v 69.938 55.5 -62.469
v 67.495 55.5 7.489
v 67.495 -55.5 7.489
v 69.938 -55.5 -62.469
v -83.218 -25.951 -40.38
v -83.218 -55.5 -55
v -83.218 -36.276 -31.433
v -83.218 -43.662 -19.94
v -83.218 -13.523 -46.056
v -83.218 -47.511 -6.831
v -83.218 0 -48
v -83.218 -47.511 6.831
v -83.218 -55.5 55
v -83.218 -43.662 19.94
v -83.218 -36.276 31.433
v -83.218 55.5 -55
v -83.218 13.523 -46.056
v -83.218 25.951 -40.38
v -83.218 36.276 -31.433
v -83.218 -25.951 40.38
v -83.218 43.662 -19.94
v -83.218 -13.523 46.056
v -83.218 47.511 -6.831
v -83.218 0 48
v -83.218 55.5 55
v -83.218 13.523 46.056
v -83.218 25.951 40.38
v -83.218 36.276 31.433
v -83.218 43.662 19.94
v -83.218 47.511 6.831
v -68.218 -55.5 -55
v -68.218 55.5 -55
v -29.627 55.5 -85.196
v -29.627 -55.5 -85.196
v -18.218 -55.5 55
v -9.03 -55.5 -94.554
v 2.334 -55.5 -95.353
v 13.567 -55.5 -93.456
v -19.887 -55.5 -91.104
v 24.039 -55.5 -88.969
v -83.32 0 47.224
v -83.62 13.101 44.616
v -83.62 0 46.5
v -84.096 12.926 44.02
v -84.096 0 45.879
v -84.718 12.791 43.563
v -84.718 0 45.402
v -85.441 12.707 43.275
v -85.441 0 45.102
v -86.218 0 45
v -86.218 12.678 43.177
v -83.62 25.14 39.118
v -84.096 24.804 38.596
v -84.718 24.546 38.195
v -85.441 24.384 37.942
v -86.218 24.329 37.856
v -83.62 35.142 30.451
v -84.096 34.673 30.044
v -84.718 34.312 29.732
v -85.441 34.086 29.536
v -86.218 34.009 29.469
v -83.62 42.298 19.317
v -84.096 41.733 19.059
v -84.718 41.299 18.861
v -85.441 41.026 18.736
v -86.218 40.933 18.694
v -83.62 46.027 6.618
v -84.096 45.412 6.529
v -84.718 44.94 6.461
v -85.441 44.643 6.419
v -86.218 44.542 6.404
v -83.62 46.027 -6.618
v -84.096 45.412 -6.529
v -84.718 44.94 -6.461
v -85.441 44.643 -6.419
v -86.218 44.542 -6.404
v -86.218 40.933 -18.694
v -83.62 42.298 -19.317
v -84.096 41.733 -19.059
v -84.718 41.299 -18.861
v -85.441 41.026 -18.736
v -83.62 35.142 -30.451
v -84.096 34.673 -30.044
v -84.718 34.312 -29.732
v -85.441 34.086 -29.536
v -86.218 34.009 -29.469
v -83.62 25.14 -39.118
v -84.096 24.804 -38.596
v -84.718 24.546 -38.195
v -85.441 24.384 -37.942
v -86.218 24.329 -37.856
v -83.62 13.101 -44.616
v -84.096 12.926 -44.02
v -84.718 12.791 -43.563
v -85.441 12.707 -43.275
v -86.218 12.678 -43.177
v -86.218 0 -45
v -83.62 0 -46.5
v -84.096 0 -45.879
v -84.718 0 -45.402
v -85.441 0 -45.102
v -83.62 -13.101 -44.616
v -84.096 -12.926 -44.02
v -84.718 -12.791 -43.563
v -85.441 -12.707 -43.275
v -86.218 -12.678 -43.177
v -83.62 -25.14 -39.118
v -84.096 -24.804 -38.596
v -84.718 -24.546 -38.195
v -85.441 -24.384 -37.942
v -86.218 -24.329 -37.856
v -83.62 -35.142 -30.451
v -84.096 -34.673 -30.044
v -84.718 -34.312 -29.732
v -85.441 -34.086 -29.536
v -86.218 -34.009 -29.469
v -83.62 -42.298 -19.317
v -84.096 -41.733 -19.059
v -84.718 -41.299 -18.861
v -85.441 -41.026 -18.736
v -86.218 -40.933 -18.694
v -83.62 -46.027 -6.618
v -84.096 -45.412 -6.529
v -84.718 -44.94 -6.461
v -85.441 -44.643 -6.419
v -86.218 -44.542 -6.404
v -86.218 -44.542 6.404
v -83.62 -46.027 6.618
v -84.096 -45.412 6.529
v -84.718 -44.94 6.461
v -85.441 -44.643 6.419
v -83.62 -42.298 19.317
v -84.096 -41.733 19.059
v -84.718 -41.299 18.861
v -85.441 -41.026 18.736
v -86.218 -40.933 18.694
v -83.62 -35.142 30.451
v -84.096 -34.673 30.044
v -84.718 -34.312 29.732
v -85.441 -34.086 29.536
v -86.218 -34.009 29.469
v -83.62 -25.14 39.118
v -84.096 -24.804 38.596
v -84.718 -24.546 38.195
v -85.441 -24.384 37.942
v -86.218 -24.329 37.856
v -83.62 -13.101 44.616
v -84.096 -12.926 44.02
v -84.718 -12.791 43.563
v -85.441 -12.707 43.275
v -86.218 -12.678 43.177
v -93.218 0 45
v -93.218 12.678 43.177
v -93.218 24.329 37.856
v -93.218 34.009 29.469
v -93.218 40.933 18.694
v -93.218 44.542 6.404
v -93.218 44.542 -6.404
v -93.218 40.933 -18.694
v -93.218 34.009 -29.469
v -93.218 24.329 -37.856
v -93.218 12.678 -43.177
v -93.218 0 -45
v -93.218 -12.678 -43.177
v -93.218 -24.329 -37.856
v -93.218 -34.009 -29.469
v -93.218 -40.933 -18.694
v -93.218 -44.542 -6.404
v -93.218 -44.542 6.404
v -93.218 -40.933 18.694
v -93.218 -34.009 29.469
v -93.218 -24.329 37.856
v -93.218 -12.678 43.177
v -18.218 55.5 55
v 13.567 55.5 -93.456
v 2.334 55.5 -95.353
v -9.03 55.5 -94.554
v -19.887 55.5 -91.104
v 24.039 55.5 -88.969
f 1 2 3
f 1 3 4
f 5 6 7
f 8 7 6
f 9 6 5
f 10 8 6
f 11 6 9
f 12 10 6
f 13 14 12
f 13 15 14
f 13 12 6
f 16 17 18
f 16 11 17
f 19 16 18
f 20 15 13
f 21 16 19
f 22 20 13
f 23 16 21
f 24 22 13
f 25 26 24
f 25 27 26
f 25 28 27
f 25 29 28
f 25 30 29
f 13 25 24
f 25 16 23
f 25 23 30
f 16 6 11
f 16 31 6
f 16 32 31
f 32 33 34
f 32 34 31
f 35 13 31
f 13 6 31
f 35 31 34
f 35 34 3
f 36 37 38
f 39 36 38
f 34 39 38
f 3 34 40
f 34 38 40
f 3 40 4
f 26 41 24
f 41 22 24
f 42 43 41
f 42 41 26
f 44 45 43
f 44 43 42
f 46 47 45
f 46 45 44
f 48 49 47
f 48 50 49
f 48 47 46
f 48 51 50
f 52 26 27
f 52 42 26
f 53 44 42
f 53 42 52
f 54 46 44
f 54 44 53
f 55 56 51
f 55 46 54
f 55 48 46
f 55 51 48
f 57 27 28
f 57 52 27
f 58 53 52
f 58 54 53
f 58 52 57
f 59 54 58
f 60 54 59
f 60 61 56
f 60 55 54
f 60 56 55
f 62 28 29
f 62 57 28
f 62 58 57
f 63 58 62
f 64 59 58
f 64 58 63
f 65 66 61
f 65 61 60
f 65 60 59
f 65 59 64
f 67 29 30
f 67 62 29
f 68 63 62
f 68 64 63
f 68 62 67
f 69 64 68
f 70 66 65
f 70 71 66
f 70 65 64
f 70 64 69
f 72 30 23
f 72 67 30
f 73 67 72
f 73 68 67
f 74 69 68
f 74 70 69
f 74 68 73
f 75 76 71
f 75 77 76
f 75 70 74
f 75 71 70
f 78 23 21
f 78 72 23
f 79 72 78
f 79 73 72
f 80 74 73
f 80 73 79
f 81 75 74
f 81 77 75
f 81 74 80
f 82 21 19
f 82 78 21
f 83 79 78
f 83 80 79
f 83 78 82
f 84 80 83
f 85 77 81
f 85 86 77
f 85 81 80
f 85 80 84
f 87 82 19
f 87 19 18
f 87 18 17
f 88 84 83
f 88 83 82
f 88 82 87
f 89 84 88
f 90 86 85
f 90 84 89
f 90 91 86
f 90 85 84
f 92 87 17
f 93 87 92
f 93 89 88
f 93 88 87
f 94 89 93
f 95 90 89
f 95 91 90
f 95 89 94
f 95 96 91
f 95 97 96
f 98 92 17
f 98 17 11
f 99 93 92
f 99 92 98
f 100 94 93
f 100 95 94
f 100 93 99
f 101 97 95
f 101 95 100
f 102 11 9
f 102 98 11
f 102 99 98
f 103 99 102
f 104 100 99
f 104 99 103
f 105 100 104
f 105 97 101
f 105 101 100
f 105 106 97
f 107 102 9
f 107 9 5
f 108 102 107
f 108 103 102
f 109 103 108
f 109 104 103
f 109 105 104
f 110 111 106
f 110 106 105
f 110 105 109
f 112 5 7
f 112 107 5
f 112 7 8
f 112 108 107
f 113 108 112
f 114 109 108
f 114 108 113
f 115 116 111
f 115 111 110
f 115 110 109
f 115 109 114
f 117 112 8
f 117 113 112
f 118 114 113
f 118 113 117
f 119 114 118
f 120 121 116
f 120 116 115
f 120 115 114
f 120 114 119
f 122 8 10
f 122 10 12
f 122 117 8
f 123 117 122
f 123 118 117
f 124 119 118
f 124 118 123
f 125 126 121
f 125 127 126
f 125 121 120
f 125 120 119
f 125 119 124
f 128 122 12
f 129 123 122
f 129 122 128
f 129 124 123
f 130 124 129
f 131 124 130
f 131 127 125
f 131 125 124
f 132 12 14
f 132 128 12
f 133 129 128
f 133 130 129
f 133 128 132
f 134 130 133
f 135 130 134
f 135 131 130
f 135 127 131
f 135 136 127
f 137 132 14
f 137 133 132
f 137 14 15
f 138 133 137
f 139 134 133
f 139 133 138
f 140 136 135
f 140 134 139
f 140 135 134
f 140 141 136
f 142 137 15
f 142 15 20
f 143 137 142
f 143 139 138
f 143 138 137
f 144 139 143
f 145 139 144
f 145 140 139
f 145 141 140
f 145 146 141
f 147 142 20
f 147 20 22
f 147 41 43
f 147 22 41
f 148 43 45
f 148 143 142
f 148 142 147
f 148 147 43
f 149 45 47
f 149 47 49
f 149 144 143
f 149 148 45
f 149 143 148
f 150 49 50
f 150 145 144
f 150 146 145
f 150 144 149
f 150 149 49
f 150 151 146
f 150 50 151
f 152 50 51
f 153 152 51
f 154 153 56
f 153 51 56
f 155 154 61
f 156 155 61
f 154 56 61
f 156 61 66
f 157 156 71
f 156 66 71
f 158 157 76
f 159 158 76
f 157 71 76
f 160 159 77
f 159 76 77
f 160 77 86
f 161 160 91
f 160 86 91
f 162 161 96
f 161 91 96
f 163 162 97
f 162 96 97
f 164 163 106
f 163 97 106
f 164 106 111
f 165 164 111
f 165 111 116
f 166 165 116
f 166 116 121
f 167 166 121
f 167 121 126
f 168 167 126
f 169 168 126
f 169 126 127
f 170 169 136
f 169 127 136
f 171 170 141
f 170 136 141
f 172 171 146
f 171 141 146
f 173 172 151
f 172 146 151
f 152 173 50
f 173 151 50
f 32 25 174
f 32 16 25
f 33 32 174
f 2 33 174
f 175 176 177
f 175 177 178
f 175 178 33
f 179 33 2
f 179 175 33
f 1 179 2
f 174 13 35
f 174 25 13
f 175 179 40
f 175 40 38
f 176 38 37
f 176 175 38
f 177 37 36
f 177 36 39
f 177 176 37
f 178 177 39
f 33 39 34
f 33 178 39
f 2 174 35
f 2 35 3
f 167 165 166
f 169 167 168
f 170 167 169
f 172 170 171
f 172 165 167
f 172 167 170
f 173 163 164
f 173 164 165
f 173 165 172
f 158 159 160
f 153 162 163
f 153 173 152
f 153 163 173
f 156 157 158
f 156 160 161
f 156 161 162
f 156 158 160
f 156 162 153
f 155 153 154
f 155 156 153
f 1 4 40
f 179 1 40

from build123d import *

# Parameters (mm, degrees)
BOSS_EXTRUDE1_DEPTH      = 55.5
BOSS_EXTRUDE1_DEPTH_BACK = 55.5
SKETCH2_R                = 45
BOSS_EXTRUDE2_DEPTH      = 10
FILLET1_R                = 3


with BuildPart() as part:
    # Sketch1 → Boss-Extrude1 (new body, two sides)
    with BuildSketch(Plane(origin=(0, 0, 0), x_dir=(1, 0, 0), z_dir=(0, 1, 0))) as boss_extrude1_sk:
        with BuildLine():
            Line((0, 0), (65, 0))
            Line((65, 0), (150.7127313, 47.511342784))
            Line((150.7127313, 47.511342784), (153.155696069, 117.468700675))
            Line((153.155696069, 117.468700675), (107.256349668, 143.968700675))
            ThreePointArc((107.256349668, 143.968700675), (79.846161337, 150.2914933), (53.590163022, 140.196014935))
            Line((53.590163022, 140.196014935), (15, 110))
            Line((15, 110), (0, 110))
            Line((0, 110), (0, 0))
        make_face()
    extrude(amount=BOSS_EXTRUDE1_DEPTH)
    extrude(boss_extrude1_sk.sketch, amount=-BOSS_EXTRUDE1_DEPTH_BACK)

    # Sketch2 → Boss-Extrude2 (add)
    with BuildSketch(Plane.ZY):
        with Locations((-55, 0)):
            Circle(SKETCH2_R)
    extrude(amount=BOSS_EXTRUDE2_DEPTH)

    # Fillet1
    fillet1_edges = [part.edges().sort_by_distance(p)[0] for p in [
        (0, 0, -100),
    ]]
    fillet(fillet1_edges, radius=FILLET1_R)


with BuildPart() as part_1:
    # Body-Move_Copy1: moved
    add(part.part.moved(Location((-83.217640918, 0, 55))))


solid = part_1.part
